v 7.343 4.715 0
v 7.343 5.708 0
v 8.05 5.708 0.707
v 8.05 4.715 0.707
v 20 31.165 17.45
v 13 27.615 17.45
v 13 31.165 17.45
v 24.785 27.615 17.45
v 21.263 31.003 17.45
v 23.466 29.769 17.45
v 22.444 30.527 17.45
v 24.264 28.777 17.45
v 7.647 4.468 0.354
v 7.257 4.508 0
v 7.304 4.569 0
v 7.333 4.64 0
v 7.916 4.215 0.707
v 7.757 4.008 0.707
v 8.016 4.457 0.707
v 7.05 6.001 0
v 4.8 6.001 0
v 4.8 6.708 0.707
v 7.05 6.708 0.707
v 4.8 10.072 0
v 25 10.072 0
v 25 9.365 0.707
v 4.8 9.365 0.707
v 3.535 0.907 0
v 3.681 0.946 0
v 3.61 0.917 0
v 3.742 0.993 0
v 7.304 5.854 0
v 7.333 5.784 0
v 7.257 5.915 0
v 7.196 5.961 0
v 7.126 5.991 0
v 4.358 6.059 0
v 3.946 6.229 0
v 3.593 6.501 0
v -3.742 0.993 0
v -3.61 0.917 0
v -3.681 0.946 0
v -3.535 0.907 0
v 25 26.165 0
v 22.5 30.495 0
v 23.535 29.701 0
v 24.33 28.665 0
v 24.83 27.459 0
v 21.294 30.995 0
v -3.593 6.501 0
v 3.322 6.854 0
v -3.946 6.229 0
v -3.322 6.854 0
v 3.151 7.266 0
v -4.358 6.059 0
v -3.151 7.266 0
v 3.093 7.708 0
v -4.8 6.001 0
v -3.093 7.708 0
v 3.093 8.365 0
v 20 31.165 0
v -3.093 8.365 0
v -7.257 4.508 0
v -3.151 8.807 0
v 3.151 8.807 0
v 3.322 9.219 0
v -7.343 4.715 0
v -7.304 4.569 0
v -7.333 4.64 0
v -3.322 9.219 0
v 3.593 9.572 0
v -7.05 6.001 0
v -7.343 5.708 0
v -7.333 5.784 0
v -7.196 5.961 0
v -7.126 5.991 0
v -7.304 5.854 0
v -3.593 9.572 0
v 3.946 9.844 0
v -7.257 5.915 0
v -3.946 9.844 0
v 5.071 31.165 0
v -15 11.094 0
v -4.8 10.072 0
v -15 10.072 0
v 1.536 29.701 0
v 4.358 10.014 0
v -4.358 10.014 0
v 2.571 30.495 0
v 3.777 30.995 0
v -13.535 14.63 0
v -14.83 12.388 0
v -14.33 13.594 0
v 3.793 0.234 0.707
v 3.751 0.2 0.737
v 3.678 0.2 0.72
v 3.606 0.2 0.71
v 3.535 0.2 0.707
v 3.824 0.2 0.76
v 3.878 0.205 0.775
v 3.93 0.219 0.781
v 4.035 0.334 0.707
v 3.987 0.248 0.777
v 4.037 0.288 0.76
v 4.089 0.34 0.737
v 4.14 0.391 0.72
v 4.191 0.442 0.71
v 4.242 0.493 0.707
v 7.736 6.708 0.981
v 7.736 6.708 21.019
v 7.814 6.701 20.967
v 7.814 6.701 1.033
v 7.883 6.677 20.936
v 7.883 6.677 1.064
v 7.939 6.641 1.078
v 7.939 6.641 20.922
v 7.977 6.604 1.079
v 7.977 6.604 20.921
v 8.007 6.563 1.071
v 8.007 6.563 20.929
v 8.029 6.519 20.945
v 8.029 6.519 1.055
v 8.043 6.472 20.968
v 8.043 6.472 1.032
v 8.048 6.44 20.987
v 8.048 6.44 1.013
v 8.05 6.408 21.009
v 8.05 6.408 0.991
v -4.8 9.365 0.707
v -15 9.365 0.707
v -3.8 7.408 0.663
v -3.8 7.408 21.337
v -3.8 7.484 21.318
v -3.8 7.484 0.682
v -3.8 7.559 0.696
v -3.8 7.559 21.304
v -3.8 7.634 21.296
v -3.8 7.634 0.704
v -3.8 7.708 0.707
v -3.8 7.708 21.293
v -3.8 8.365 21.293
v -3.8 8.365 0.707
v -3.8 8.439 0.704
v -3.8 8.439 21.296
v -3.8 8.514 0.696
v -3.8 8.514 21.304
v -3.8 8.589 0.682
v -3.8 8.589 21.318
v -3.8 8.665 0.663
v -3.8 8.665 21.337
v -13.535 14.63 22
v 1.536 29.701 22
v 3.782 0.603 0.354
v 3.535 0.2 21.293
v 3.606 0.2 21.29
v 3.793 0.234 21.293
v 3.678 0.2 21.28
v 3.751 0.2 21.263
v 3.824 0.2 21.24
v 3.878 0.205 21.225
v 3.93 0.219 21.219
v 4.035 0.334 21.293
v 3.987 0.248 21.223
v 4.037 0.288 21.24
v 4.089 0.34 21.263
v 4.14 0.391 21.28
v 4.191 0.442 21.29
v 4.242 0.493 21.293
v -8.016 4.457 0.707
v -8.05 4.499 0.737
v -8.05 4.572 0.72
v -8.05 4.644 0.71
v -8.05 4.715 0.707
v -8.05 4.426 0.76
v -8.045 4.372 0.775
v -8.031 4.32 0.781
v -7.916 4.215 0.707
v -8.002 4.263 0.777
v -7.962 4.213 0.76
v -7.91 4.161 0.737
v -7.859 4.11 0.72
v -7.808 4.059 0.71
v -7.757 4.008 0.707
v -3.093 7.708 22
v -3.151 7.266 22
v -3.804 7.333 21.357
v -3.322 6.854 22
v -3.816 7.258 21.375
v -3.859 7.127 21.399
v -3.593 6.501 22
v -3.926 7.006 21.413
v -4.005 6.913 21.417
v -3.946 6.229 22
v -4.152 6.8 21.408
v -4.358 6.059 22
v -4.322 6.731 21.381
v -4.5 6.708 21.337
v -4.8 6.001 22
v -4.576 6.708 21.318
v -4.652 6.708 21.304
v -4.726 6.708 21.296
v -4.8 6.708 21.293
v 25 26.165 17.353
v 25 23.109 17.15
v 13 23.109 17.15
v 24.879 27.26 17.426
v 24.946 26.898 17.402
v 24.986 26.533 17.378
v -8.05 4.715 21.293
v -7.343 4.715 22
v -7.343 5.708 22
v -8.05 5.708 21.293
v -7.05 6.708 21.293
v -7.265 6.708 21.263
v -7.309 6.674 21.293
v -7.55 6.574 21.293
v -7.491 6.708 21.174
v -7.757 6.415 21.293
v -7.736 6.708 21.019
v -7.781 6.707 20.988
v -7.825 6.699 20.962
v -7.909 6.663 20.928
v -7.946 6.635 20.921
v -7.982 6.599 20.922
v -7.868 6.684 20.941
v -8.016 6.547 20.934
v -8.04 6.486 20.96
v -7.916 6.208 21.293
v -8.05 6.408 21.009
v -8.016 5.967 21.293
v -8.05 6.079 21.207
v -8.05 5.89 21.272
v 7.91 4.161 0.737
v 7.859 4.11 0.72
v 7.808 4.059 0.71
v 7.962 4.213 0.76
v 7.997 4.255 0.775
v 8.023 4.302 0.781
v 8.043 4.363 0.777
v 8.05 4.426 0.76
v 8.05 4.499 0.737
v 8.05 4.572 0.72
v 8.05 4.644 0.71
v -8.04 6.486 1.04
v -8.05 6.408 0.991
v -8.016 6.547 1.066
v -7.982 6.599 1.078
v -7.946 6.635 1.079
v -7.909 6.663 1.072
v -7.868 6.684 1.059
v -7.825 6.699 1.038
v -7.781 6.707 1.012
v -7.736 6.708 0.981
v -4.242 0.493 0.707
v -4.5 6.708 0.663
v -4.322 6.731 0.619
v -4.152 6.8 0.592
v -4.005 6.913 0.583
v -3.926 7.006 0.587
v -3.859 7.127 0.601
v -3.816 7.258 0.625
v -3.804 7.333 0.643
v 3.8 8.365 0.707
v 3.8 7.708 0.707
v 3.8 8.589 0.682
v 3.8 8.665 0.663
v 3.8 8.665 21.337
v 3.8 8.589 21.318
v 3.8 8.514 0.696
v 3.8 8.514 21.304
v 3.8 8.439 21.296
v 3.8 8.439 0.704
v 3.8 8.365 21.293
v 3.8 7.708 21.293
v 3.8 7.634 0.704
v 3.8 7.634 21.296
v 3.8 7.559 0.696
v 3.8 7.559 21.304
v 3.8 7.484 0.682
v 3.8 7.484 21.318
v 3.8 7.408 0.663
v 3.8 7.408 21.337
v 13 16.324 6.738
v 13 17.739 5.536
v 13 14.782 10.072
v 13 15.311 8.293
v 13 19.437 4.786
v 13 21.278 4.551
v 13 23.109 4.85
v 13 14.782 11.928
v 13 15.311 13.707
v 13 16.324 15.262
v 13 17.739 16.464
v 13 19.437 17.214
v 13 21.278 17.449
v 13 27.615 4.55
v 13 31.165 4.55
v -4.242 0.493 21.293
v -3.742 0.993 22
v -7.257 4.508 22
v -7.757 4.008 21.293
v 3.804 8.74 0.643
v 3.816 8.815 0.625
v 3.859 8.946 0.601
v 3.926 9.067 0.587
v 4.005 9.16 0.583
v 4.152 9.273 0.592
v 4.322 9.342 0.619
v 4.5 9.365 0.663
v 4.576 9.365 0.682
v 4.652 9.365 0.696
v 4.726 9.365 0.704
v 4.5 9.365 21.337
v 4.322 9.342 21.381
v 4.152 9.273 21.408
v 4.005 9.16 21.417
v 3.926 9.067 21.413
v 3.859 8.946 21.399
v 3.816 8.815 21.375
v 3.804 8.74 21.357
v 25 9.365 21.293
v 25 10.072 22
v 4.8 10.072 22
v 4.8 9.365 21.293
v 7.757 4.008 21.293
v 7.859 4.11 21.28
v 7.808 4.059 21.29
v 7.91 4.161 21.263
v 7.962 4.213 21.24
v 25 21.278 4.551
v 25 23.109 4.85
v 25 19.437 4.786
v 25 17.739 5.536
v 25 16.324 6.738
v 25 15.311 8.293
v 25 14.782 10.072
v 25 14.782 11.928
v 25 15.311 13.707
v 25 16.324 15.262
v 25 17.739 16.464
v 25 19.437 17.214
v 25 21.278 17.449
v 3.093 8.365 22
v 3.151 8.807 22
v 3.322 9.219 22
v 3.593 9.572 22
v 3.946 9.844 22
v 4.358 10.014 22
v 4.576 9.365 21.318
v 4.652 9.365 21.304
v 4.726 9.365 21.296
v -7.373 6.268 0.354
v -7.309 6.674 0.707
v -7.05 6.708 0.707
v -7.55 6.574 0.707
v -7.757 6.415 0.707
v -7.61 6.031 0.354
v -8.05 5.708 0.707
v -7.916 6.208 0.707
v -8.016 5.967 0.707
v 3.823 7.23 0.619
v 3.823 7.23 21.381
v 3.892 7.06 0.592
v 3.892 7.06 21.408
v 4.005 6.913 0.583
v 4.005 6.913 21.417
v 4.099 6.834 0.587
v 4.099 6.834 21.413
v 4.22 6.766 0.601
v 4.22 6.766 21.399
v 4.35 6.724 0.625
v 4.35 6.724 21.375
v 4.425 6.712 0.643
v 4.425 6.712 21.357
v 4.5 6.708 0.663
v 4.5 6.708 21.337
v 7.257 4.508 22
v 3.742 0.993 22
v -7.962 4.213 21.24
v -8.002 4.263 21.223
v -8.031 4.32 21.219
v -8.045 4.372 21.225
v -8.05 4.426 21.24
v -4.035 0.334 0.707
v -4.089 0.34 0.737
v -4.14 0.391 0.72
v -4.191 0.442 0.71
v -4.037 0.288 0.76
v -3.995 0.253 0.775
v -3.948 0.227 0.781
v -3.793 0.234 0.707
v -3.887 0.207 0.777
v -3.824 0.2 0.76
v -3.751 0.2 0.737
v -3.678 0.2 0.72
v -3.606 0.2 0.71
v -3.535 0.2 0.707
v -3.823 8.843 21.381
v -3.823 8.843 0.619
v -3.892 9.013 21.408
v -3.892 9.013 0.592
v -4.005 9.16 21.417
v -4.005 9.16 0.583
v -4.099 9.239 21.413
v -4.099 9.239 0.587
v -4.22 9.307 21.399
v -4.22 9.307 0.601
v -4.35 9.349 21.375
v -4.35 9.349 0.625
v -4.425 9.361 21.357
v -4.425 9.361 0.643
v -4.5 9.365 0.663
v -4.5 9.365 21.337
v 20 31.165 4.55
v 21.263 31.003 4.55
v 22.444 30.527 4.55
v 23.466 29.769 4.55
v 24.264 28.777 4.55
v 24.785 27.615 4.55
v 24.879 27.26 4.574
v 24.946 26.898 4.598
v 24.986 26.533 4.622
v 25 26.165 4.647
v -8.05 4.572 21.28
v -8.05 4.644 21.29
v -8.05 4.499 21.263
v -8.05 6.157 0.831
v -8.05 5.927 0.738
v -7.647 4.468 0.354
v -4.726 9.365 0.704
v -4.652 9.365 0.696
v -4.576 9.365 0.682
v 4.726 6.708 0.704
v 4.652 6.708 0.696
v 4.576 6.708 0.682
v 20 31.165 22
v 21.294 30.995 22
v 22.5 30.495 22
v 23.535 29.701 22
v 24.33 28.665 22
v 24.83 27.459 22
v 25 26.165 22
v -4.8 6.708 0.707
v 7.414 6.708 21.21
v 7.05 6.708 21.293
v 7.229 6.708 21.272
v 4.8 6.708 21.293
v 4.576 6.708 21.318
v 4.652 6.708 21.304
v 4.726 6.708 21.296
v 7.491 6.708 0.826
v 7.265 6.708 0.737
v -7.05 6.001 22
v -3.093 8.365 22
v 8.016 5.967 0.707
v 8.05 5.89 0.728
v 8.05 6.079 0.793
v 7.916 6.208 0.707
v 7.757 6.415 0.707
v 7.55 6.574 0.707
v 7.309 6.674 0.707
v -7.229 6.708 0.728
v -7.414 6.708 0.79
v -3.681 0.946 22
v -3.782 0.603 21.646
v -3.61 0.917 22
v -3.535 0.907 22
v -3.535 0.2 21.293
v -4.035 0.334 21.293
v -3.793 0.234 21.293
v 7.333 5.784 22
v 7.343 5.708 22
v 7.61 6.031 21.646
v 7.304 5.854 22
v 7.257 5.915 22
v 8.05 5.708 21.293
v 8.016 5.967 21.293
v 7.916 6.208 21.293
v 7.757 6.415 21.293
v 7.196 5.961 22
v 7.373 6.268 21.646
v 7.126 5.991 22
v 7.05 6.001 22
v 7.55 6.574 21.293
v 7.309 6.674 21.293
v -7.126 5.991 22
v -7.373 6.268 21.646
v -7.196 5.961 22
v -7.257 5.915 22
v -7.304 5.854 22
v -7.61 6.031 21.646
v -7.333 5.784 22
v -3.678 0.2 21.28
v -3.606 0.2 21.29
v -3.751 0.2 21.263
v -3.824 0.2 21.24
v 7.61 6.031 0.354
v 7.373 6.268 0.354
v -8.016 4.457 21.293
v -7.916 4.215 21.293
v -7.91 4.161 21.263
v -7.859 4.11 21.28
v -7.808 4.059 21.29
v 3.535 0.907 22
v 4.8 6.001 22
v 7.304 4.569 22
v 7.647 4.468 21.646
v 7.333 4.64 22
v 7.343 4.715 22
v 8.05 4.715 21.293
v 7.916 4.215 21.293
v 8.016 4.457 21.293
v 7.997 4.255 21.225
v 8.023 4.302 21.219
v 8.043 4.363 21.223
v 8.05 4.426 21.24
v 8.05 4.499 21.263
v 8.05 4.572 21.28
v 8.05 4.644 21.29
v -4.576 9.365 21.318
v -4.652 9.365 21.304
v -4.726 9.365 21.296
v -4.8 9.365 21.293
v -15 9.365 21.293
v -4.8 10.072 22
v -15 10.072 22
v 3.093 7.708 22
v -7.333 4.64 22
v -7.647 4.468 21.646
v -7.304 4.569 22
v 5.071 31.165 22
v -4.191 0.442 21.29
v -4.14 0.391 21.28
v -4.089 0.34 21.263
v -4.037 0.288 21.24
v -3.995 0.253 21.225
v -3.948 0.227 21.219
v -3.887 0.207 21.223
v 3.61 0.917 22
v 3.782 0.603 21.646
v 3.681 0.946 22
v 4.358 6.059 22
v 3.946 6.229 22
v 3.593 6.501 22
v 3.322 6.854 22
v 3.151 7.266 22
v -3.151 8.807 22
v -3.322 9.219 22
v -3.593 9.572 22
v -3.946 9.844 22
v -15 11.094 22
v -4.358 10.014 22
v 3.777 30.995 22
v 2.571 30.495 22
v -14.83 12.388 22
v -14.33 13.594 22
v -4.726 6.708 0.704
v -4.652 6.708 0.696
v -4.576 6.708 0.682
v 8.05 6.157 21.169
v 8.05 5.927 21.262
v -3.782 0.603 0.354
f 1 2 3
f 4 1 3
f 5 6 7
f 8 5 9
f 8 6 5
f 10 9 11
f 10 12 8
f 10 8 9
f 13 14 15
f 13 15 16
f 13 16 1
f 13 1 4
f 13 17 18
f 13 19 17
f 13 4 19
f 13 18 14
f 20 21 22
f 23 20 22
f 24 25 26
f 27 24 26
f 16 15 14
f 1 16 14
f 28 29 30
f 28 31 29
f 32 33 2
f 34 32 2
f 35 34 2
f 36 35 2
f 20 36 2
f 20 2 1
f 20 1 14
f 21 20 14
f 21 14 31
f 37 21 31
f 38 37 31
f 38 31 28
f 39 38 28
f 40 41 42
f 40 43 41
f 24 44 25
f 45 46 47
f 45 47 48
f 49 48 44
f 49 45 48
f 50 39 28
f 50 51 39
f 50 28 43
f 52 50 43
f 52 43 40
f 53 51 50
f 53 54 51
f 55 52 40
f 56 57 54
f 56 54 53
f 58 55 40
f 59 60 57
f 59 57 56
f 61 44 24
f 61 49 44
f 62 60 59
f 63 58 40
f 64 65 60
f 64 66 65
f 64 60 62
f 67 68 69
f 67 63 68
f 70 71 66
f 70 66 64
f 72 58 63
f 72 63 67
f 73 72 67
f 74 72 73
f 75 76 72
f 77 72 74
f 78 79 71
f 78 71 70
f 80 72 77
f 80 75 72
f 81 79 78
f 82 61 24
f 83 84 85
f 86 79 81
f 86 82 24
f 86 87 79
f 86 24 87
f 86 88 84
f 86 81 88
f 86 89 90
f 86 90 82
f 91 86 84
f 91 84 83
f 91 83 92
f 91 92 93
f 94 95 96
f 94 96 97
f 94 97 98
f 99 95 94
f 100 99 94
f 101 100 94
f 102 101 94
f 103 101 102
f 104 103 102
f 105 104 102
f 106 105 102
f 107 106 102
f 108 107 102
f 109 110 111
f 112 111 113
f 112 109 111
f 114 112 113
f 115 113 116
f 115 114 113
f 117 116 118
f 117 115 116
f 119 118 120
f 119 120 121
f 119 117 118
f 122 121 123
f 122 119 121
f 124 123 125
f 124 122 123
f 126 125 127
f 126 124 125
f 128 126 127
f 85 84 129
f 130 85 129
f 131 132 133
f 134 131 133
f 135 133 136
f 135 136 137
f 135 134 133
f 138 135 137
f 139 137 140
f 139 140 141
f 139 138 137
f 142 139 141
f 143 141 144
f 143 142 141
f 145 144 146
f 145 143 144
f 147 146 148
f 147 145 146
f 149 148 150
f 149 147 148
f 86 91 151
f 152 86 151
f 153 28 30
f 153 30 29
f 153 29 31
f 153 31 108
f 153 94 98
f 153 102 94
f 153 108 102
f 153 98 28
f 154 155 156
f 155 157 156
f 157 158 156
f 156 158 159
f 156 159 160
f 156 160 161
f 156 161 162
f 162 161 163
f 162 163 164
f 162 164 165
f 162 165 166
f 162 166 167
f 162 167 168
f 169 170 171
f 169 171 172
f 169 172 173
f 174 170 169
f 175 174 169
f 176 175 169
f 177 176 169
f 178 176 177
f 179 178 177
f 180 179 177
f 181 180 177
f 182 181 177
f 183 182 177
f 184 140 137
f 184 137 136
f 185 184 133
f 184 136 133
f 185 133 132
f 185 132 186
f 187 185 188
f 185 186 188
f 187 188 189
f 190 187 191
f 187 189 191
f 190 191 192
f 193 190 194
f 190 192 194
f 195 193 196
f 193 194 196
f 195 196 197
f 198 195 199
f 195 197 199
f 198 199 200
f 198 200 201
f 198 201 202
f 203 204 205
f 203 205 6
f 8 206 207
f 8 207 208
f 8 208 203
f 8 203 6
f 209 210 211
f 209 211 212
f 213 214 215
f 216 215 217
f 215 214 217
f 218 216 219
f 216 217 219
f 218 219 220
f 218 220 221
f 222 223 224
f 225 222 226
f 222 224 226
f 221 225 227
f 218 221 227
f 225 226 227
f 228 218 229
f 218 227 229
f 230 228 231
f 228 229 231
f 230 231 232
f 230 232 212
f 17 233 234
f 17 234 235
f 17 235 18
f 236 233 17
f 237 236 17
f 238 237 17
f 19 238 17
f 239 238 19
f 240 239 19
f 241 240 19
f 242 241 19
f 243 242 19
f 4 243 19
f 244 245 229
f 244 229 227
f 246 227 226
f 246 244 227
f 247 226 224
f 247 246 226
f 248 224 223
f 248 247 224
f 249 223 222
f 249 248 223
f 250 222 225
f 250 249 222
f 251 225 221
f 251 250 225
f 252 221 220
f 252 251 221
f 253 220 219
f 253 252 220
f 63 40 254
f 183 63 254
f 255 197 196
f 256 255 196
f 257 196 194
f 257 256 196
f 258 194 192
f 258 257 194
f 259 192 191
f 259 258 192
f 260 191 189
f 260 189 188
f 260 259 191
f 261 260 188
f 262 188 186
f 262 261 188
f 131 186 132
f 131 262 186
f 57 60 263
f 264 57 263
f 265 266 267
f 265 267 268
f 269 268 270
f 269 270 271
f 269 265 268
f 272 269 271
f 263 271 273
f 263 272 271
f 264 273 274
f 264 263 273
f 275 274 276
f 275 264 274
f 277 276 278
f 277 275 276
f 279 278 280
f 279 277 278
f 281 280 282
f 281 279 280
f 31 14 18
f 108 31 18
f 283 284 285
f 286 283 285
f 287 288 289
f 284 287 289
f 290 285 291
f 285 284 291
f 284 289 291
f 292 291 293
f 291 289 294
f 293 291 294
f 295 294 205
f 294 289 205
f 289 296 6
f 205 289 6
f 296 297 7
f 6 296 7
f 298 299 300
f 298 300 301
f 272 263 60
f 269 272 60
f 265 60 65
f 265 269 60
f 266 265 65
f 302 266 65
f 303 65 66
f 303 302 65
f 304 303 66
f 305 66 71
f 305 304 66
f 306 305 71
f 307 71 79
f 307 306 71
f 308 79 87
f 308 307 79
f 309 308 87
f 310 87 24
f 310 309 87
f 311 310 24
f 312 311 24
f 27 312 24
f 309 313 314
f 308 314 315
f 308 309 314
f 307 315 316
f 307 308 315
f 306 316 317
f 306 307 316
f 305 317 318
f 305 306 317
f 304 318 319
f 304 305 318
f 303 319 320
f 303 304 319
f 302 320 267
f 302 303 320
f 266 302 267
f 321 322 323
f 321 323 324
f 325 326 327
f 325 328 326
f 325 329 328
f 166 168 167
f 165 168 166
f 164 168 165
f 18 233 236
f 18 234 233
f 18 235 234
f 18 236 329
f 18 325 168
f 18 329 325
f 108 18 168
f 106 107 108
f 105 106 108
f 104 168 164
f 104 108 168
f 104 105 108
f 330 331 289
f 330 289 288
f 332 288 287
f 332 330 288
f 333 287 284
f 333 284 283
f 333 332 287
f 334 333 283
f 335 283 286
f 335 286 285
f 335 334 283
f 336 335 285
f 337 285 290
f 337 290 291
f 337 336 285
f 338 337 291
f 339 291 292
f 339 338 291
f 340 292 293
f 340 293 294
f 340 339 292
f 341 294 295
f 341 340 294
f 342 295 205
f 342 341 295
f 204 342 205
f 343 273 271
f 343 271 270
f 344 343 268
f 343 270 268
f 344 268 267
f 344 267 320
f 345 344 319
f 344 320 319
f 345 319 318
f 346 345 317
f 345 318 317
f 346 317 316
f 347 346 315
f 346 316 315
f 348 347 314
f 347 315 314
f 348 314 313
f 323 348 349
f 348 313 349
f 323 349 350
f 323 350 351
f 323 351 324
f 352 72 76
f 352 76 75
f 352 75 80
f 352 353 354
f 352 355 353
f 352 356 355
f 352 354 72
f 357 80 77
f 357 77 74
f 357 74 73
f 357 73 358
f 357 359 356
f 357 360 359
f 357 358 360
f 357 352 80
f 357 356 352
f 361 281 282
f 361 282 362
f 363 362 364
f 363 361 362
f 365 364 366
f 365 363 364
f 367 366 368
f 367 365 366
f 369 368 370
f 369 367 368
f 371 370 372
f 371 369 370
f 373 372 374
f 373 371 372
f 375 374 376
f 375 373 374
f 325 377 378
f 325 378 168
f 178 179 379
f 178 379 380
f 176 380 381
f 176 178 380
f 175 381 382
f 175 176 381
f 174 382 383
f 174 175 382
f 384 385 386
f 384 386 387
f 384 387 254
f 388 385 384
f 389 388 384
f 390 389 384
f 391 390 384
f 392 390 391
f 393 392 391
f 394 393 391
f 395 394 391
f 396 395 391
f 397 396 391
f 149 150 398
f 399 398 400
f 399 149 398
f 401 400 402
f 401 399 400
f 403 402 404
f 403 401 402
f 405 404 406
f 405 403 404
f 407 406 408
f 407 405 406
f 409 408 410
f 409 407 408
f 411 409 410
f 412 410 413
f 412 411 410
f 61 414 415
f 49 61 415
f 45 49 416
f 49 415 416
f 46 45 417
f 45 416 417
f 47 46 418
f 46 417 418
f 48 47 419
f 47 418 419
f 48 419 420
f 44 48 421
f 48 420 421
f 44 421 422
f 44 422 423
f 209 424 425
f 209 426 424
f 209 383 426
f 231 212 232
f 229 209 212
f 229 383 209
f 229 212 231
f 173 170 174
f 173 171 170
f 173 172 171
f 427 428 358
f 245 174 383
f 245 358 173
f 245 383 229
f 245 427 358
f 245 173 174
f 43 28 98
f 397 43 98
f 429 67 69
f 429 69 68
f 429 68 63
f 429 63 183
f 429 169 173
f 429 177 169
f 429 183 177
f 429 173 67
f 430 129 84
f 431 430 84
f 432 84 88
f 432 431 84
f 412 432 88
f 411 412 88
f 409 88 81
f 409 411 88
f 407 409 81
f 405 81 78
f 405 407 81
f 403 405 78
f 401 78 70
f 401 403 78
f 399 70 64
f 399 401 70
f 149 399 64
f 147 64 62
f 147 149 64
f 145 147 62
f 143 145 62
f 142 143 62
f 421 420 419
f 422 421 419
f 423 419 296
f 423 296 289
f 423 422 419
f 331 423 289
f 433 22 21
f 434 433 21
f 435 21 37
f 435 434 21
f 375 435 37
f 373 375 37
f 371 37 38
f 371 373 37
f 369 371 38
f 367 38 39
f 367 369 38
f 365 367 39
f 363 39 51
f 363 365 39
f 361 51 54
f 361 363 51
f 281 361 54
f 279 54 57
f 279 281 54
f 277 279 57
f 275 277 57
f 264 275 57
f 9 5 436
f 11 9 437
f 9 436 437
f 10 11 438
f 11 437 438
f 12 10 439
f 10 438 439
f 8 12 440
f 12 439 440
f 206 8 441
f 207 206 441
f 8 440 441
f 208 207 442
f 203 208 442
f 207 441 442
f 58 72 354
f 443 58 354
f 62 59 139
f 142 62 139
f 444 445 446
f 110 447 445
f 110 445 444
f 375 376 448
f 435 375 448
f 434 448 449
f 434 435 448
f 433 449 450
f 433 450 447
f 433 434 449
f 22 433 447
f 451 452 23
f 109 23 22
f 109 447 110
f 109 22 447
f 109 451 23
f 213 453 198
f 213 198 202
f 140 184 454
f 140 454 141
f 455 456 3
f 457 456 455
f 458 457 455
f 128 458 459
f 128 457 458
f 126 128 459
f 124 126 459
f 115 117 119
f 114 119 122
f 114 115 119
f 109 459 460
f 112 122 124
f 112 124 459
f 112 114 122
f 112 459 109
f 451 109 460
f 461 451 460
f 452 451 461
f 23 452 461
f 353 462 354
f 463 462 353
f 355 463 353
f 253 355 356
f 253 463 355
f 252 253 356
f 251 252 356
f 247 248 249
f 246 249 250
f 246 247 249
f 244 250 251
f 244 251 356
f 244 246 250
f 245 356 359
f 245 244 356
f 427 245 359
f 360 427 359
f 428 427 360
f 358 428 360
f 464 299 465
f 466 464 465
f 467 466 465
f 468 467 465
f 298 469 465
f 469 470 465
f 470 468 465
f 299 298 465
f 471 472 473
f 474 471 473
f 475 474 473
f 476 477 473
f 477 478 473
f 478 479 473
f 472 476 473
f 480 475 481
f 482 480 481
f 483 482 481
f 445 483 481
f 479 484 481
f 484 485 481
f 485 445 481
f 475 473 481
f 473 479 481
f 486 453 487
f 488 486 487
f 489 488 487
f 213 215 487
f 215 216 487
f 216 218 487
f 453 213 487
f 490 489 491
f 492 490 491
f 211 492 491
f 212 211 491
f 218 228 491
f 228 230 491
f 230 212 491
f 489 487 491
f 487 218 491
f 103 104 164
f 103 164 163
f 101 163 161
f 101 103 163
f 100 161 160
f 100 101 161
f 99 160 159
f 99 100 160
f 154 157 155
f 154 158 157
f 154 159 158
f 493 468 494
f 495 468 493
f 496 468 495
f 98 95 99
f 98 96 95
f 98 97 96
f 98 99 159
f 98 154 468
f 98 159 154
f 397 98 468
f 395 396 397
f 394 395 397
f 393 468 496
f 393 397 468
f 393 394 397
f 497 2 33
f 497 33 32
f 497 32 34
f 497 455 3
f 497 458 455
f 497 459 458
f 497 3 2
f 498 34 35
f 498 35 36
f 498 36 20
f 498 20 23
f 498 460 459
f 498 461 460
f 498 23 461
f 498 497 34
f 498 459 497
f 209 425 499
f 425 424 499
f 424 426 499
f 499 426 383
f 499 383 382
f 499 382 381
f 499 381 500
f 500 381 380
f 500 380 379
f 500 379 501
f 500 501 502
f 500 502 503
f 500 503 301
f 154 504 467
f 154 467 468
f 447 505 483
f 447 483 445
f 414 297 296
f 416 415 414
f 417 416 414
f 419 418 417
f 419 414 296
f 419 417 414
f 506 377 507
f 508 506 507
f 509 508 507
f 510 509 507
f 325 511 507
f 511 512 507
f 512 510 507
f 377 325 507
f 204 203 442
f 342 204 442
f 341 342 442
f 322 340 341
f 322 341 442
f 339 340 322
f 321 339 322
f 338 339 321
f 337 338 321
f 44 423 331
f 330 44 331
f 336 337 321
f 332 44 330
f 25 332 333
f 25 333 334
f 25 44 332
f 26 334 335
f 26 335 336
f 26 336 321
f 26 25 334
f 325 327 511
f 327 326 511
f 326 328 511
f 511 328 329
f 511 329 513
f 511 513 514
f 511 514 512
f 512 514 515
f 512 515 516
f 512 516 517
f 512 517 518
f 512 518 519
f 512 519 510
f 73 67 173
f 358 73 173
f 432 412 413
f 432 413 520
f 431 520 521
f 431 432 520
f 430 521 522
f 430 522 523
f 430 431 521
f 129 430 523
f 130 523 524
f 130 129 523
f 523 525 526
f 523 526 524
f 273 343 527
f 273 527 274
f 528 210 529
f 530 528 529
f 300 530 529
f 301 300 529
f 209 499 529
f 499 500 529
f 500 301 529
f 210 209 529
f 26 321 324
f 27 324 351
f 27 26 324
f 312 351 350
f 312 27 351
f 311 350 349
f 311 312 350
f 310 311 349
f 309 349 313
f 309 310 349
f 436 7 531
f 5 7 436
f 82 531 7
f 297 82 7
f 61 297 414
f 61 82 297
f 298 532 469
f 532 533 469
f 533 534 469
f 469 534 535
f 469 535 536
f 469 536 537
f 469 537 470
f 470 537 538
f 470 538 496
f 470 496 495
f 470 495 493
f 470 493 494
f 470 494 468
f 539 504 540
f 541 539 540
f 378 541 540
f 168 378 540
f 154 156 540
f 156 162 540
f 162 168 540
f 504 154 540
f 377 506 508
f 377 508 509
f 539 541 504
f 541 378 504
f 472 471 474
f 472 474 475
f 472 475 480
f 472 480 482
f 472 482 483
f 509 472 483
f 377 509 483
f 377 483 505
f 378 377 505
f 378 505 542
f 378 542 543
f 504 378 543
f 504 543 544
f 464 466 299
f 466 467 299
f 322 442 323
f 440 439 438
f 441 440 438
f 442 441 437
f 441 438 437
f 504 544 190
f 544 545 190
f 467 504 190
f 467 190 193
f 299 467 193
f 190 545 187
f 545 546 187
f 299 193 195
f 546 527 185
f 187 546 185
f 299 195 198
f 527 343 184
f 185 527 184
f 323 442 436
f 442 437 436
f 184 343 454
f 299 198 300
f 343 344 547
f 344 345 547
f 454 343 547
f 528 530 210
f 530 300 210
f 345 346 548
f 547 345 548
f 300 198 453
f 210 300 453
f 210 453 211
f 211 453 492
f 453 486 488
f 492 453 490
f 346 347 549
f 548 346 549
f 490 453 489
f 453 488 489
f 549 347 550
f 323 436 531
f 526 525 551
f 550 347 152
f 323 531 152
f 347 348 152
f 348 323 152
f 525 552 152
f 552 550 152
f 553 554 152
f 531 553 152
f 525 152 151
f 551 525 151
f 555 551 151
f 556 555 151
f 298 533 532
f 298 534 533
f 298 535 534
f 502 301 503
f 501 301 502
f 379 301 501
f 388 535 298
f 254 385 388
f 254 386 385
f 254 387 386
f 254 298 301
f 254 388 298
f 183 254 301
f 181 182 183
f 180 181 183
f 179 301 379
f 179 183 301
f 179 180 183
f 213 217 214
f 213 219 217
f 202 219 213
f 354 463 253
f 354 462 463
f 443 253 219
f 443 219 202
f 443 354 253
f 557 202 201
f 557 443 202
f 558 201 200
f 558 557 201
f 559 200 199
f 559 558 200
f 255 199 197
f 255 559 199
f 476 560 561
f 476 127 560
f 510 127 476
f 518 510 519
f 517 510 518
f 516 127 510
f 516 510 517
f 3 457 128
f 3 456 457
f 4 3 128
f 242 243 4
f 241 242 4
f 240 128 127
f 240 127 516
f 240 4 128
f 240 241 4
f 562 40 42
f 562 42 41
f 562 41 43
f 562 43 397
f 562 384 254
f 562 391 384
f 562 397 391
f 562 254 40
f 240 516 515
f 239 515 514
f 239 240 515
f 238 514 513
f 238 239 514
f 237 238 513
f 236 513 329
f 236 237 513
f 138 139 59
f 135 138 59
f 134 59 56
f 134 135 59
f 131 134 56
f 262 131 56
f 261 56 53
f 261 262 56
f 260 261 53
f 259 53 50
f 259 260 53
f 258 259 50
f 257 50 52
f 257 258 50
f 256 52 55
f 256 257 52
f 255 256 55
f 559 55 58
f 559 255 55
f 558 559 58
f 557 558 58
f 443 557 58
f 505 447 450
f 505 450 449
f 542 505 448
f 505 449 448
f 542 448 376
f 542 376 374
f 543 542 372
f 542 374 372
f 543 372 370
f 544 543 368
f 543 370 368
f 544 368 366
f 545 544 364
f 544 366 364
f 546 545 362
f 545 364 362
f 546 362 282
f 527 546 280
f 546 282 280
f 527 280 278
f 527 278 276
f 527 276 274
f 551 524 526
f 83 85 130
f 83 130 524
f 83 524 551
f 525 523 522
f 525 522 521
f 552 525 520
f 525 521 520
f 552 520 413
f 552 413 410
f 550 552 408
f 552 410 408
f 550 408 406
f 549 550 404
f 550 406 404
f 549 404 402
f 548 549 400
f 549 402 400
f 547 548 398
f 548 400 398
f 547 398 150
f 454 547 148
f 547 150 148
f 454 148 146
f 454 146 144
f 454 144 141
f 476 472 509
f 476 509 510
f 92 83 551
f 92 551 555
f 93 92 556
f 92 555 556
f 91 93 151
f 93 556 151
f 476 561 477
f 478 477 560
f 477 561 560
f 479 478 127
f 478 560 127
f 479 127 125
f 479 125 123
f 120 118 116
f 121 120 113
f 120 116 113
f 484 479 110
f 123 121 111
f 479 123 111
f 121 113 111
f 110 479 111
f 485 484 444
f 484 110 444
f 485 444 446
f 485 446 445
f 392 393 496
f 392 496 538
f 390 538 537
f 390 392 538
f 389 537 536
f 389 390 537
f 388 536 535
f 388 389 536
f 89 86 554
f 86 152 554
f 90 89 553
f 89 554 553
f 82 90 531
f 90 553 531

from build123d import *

# Parameters (mm, degrees)
BOSS_EXTRUDE1_DEPTH = 22
CUT_EXTRUDE1_DEPTH  = 12
CHAMFER1_SIZE       = 18
FILLET1_R           = 5
FILLET2_R           = 5


with BuildPart() as part:
    # Sketch2 → Boss-Extrude1 (new body)
    with BuildSketch(Plane.XY):
        with BuildLine():
            Line((14.99994, 31.165268255), (24.99994, 31.165268255))
            Line((24.99994, 31.165268255), (24.99994, 9.365268255))
            Line((24.99994, 9.365268255), (14.99994, 9.365268255))
            Line((14.99994, 9.365268255), (12.999948, 9.365268255))
            Line((12.999948, 9.365268255), (4.5, 9.365268255))
            ThreePointArc((4.5, 9.365268255), (4.005025253, 9.160243002), (3.8, 8.665268255))
            Line((3.8, 8.665268255), (3.8, 7.407802905))
            ThreePointArc((3.8, 7.407802905), (4.005025253, 6.912828158), (4.5, 6.707802905))
            Line((4.5, 6.707802905), (7.736453928, 6.707802905))
            ThreePointArc((7.736453928, 6.707802905), (7.957266257, 6.624965773), (8.049967, 6.408109491))
            Line((8.049967, 6.408109491), (8.049967, 4.425516287))
            ThreePointArc((8.049967, 4.425516287), (8.027131012, 4.310712023), (7.96209962, 4.213385667))
            Line((7.96209962, 4.213385667), (4.036581333, 0.28786738))
            ThreePointArc((4.036581333, 0.28786738), (3.939254977, 0.222835988), (3.824450713, 0.2))
            Line((3.824450713, 0.2), (-3.824450713, 0.2))
            ThreePointArc((-3.824450713, 0.2), (-3.939254977, 0.222835988), (-4.036581333, 0.28786738))
            Line((-4.036581333, 0.28786738), (-7.96209962, 4.213385667))
            ThreePointArc((-7.96209962, 4.213385667), (-8.027131012, 4.310712023), (-8.049967, 4.425516287))
            Line((-8.049967, 4.425516287), (-8.049967, 6.408109491))
            ThreePointArc((-8.049967, 6.408109491), (-7.957266257, 6.624965773), (-7.736453928, 6.707802905))
            Line((-7.736453928, 6.707802905), (-4.5, 6.707802905))
            ThreePointArc((-4.5, 6.707802905), (-4.005025253, 6.912828158), (-3.8, 7.407802905))
            Line((-3.8, 7.407802905), (-3.8, 8.665268255))
            ThreePointArc((-3.8, 8.665268255), (-4.005025253, 9.160243002), (-4.5, 9.365268255))
            Line((-4.5, 9.365268255), (-12.999948, 9.365268255))
            Line((-12.999948, 9.365268255), (-14.99994, 9.365268255))
            Line((-14.99994, 9.365268255), (-14.99994, 31.165268255))
            Line((-14.99994, 31.165268255), (14.99994, 31.165268255))
        make_face()
    extrude(amount=BOSS_EXTRUDE1_DEPTH)

    # Sketch3 → Cut-Extrude1 (cut)
    with BuildSketch(Plane(origin=(24.99994, 0, 0), x_dir=(0, 0, -1), z_dir=(1, 0, 0))):
        with BuildLine():
            Line((-17.45, 31.165268255), (-4.55, 31.165268255))
            Line((-4.55, 31.165268255), (-4.55, 27.615268255))
            Line((-4.55, 27.615268255), (-4.85, 23.109490465))
            ThreePointArc((-4.85, 23.109490465), (-11, 14.715268255), (-17.15, 23.109490465))
            Line((-17.15, 23.109490465), (-17.45, 27.615268255))
            Line((-17.45, 27.615268255), (-17.45, 31.165268255))
        make_face()
    extrude(amount=-CUT_EXTRUDE1_DEPTH, mode=Mode.SUBTRACT)

    # Chamfer1
    chamfer1_edges = [part.edges().sort_by_distance(p)[0] for p in [
        (-14.99994, 31.165268255, 11),
    ]]
    chamfer(chamfer1_edges, length=CHAMFER1_SIZE)

    # Fillet1
    fillet1_edges = [part.edges().sort_by_distance(p)[0] for p in [
        (-14.99994, 13.165268255, 11),
        (3.00006, 31.165268255, 11),
    ]]
    fillet(fillet1_edges, radius=FILLET1_R)

    # Fillet2
    fillet2_edges = [part.edges().sort_by_distance(p)[0] for p in [
        (24.99994, 31.165268255, 2.275),
        (24.99994, 31.165268255, 19.725),
    ]]
    fillet(fillet2_edges, radius=FILLET2_R)

    # Cut-Sweep7: sweep along a path in Sketch43
    with BuildLine(Plane.XY.offset(22)) as cut_sweep7_path:
        Line((-14.99994, 9.365268255), (-4.8, 9.365268255))
        ThreePointArc((-4.8, 9.365268255), (-4.092893219, 9.072375036), (-3.8, 8.365268255))
        Line((-3.8, 8.365268255), (-3.8, 7.707802905))
        ThreePointArc((-3.8, 7.707802905), (-4.092893219, 7.000696124), (-4.8, 6.707802905))
        Line((-4.8, 6.707802905), (-7.049967, 6.707802905))
        ThreePointArc((-7.049967, 6.707802905), (-7.757073781, 6.414909686), (-8.049967, 5.707802905))
        Line((-8.049967, 5.707802905), (-8.049967, 4.715466609))
        ThreePointArc((-8.049967, 4.715466609), (-7.973846533, 4.332783177), (-7.757073781, 4.008359828))
        Line((-7.757073781, 4.008359828), (-4.241607172, 0.492893219))
        ThreePointArc((-4.241607172, 0.492893219), (-3.917183823, 0.276120467), (-3.534500391, 0.2))
        Line((-3.534500391, 0.2), (3.534500391, 0.2))
        ThreePointArc((3.534500391, 0.2), (3.917183823, 0.276120467), (4.241607172, 0.492893219))
        Line((4.241607172, 0.492893219), (7.757073781, 4.008359828))
        ThreePointArc((7.757073781, 4.008359828), (7.973846533, 4.332783177), (8.049967, 4.715466609))
        Line((8.049967, 4.715466609), (8.049967, 5.707802905))
        ThreePointArc((8.049967, 5.707802905), (7.757073781, 6.414909686), (7.049967, 6.707802905))
        Line((7.049967, 6.707802905), (4.8, 6.707802905))
        ThreePointArc((4.8, 6.707802905), (4.092893219, 7.000696124), (3.8, 7.707802905))
        Line((3.8, 7.707802905), (3.8, 8.365268255))
        ThreePointArc((3.8, 8.365268255), (4.092893219, 9.072375036), (4.8, 9.365268255))
        Line((4.8, 9.365268255), (14.99994, 9.365268255))
        Line((14.99994, 9.365268255), (24.99994, 9.365268255))
    # Sketch4 → Cut-Sweep7 (sweep, cut)
    with BuildSketch(Plane.ZY.offset(14.99994)):
        Polygon((22, 10.072375036), (22.707106781, 9.365268255), (22, 8.658161474), (20.776291928, 8.963134662), (21.292893219, 9.365268255), align=None)
    cut_sweep7 = sweep(path=cut_sweep7_path.line, mode=Mode.SUBTRACT)

    # Mirror1: Cut-Sweep7 across plane
    add(cut_sweep7.mirror(Plane(origin=(0, 0, 11), x_dir=(1, 0, 0), z_dir=(0, 0, -1))), mode=Mode.SUBTRACT)


solid = part.part
